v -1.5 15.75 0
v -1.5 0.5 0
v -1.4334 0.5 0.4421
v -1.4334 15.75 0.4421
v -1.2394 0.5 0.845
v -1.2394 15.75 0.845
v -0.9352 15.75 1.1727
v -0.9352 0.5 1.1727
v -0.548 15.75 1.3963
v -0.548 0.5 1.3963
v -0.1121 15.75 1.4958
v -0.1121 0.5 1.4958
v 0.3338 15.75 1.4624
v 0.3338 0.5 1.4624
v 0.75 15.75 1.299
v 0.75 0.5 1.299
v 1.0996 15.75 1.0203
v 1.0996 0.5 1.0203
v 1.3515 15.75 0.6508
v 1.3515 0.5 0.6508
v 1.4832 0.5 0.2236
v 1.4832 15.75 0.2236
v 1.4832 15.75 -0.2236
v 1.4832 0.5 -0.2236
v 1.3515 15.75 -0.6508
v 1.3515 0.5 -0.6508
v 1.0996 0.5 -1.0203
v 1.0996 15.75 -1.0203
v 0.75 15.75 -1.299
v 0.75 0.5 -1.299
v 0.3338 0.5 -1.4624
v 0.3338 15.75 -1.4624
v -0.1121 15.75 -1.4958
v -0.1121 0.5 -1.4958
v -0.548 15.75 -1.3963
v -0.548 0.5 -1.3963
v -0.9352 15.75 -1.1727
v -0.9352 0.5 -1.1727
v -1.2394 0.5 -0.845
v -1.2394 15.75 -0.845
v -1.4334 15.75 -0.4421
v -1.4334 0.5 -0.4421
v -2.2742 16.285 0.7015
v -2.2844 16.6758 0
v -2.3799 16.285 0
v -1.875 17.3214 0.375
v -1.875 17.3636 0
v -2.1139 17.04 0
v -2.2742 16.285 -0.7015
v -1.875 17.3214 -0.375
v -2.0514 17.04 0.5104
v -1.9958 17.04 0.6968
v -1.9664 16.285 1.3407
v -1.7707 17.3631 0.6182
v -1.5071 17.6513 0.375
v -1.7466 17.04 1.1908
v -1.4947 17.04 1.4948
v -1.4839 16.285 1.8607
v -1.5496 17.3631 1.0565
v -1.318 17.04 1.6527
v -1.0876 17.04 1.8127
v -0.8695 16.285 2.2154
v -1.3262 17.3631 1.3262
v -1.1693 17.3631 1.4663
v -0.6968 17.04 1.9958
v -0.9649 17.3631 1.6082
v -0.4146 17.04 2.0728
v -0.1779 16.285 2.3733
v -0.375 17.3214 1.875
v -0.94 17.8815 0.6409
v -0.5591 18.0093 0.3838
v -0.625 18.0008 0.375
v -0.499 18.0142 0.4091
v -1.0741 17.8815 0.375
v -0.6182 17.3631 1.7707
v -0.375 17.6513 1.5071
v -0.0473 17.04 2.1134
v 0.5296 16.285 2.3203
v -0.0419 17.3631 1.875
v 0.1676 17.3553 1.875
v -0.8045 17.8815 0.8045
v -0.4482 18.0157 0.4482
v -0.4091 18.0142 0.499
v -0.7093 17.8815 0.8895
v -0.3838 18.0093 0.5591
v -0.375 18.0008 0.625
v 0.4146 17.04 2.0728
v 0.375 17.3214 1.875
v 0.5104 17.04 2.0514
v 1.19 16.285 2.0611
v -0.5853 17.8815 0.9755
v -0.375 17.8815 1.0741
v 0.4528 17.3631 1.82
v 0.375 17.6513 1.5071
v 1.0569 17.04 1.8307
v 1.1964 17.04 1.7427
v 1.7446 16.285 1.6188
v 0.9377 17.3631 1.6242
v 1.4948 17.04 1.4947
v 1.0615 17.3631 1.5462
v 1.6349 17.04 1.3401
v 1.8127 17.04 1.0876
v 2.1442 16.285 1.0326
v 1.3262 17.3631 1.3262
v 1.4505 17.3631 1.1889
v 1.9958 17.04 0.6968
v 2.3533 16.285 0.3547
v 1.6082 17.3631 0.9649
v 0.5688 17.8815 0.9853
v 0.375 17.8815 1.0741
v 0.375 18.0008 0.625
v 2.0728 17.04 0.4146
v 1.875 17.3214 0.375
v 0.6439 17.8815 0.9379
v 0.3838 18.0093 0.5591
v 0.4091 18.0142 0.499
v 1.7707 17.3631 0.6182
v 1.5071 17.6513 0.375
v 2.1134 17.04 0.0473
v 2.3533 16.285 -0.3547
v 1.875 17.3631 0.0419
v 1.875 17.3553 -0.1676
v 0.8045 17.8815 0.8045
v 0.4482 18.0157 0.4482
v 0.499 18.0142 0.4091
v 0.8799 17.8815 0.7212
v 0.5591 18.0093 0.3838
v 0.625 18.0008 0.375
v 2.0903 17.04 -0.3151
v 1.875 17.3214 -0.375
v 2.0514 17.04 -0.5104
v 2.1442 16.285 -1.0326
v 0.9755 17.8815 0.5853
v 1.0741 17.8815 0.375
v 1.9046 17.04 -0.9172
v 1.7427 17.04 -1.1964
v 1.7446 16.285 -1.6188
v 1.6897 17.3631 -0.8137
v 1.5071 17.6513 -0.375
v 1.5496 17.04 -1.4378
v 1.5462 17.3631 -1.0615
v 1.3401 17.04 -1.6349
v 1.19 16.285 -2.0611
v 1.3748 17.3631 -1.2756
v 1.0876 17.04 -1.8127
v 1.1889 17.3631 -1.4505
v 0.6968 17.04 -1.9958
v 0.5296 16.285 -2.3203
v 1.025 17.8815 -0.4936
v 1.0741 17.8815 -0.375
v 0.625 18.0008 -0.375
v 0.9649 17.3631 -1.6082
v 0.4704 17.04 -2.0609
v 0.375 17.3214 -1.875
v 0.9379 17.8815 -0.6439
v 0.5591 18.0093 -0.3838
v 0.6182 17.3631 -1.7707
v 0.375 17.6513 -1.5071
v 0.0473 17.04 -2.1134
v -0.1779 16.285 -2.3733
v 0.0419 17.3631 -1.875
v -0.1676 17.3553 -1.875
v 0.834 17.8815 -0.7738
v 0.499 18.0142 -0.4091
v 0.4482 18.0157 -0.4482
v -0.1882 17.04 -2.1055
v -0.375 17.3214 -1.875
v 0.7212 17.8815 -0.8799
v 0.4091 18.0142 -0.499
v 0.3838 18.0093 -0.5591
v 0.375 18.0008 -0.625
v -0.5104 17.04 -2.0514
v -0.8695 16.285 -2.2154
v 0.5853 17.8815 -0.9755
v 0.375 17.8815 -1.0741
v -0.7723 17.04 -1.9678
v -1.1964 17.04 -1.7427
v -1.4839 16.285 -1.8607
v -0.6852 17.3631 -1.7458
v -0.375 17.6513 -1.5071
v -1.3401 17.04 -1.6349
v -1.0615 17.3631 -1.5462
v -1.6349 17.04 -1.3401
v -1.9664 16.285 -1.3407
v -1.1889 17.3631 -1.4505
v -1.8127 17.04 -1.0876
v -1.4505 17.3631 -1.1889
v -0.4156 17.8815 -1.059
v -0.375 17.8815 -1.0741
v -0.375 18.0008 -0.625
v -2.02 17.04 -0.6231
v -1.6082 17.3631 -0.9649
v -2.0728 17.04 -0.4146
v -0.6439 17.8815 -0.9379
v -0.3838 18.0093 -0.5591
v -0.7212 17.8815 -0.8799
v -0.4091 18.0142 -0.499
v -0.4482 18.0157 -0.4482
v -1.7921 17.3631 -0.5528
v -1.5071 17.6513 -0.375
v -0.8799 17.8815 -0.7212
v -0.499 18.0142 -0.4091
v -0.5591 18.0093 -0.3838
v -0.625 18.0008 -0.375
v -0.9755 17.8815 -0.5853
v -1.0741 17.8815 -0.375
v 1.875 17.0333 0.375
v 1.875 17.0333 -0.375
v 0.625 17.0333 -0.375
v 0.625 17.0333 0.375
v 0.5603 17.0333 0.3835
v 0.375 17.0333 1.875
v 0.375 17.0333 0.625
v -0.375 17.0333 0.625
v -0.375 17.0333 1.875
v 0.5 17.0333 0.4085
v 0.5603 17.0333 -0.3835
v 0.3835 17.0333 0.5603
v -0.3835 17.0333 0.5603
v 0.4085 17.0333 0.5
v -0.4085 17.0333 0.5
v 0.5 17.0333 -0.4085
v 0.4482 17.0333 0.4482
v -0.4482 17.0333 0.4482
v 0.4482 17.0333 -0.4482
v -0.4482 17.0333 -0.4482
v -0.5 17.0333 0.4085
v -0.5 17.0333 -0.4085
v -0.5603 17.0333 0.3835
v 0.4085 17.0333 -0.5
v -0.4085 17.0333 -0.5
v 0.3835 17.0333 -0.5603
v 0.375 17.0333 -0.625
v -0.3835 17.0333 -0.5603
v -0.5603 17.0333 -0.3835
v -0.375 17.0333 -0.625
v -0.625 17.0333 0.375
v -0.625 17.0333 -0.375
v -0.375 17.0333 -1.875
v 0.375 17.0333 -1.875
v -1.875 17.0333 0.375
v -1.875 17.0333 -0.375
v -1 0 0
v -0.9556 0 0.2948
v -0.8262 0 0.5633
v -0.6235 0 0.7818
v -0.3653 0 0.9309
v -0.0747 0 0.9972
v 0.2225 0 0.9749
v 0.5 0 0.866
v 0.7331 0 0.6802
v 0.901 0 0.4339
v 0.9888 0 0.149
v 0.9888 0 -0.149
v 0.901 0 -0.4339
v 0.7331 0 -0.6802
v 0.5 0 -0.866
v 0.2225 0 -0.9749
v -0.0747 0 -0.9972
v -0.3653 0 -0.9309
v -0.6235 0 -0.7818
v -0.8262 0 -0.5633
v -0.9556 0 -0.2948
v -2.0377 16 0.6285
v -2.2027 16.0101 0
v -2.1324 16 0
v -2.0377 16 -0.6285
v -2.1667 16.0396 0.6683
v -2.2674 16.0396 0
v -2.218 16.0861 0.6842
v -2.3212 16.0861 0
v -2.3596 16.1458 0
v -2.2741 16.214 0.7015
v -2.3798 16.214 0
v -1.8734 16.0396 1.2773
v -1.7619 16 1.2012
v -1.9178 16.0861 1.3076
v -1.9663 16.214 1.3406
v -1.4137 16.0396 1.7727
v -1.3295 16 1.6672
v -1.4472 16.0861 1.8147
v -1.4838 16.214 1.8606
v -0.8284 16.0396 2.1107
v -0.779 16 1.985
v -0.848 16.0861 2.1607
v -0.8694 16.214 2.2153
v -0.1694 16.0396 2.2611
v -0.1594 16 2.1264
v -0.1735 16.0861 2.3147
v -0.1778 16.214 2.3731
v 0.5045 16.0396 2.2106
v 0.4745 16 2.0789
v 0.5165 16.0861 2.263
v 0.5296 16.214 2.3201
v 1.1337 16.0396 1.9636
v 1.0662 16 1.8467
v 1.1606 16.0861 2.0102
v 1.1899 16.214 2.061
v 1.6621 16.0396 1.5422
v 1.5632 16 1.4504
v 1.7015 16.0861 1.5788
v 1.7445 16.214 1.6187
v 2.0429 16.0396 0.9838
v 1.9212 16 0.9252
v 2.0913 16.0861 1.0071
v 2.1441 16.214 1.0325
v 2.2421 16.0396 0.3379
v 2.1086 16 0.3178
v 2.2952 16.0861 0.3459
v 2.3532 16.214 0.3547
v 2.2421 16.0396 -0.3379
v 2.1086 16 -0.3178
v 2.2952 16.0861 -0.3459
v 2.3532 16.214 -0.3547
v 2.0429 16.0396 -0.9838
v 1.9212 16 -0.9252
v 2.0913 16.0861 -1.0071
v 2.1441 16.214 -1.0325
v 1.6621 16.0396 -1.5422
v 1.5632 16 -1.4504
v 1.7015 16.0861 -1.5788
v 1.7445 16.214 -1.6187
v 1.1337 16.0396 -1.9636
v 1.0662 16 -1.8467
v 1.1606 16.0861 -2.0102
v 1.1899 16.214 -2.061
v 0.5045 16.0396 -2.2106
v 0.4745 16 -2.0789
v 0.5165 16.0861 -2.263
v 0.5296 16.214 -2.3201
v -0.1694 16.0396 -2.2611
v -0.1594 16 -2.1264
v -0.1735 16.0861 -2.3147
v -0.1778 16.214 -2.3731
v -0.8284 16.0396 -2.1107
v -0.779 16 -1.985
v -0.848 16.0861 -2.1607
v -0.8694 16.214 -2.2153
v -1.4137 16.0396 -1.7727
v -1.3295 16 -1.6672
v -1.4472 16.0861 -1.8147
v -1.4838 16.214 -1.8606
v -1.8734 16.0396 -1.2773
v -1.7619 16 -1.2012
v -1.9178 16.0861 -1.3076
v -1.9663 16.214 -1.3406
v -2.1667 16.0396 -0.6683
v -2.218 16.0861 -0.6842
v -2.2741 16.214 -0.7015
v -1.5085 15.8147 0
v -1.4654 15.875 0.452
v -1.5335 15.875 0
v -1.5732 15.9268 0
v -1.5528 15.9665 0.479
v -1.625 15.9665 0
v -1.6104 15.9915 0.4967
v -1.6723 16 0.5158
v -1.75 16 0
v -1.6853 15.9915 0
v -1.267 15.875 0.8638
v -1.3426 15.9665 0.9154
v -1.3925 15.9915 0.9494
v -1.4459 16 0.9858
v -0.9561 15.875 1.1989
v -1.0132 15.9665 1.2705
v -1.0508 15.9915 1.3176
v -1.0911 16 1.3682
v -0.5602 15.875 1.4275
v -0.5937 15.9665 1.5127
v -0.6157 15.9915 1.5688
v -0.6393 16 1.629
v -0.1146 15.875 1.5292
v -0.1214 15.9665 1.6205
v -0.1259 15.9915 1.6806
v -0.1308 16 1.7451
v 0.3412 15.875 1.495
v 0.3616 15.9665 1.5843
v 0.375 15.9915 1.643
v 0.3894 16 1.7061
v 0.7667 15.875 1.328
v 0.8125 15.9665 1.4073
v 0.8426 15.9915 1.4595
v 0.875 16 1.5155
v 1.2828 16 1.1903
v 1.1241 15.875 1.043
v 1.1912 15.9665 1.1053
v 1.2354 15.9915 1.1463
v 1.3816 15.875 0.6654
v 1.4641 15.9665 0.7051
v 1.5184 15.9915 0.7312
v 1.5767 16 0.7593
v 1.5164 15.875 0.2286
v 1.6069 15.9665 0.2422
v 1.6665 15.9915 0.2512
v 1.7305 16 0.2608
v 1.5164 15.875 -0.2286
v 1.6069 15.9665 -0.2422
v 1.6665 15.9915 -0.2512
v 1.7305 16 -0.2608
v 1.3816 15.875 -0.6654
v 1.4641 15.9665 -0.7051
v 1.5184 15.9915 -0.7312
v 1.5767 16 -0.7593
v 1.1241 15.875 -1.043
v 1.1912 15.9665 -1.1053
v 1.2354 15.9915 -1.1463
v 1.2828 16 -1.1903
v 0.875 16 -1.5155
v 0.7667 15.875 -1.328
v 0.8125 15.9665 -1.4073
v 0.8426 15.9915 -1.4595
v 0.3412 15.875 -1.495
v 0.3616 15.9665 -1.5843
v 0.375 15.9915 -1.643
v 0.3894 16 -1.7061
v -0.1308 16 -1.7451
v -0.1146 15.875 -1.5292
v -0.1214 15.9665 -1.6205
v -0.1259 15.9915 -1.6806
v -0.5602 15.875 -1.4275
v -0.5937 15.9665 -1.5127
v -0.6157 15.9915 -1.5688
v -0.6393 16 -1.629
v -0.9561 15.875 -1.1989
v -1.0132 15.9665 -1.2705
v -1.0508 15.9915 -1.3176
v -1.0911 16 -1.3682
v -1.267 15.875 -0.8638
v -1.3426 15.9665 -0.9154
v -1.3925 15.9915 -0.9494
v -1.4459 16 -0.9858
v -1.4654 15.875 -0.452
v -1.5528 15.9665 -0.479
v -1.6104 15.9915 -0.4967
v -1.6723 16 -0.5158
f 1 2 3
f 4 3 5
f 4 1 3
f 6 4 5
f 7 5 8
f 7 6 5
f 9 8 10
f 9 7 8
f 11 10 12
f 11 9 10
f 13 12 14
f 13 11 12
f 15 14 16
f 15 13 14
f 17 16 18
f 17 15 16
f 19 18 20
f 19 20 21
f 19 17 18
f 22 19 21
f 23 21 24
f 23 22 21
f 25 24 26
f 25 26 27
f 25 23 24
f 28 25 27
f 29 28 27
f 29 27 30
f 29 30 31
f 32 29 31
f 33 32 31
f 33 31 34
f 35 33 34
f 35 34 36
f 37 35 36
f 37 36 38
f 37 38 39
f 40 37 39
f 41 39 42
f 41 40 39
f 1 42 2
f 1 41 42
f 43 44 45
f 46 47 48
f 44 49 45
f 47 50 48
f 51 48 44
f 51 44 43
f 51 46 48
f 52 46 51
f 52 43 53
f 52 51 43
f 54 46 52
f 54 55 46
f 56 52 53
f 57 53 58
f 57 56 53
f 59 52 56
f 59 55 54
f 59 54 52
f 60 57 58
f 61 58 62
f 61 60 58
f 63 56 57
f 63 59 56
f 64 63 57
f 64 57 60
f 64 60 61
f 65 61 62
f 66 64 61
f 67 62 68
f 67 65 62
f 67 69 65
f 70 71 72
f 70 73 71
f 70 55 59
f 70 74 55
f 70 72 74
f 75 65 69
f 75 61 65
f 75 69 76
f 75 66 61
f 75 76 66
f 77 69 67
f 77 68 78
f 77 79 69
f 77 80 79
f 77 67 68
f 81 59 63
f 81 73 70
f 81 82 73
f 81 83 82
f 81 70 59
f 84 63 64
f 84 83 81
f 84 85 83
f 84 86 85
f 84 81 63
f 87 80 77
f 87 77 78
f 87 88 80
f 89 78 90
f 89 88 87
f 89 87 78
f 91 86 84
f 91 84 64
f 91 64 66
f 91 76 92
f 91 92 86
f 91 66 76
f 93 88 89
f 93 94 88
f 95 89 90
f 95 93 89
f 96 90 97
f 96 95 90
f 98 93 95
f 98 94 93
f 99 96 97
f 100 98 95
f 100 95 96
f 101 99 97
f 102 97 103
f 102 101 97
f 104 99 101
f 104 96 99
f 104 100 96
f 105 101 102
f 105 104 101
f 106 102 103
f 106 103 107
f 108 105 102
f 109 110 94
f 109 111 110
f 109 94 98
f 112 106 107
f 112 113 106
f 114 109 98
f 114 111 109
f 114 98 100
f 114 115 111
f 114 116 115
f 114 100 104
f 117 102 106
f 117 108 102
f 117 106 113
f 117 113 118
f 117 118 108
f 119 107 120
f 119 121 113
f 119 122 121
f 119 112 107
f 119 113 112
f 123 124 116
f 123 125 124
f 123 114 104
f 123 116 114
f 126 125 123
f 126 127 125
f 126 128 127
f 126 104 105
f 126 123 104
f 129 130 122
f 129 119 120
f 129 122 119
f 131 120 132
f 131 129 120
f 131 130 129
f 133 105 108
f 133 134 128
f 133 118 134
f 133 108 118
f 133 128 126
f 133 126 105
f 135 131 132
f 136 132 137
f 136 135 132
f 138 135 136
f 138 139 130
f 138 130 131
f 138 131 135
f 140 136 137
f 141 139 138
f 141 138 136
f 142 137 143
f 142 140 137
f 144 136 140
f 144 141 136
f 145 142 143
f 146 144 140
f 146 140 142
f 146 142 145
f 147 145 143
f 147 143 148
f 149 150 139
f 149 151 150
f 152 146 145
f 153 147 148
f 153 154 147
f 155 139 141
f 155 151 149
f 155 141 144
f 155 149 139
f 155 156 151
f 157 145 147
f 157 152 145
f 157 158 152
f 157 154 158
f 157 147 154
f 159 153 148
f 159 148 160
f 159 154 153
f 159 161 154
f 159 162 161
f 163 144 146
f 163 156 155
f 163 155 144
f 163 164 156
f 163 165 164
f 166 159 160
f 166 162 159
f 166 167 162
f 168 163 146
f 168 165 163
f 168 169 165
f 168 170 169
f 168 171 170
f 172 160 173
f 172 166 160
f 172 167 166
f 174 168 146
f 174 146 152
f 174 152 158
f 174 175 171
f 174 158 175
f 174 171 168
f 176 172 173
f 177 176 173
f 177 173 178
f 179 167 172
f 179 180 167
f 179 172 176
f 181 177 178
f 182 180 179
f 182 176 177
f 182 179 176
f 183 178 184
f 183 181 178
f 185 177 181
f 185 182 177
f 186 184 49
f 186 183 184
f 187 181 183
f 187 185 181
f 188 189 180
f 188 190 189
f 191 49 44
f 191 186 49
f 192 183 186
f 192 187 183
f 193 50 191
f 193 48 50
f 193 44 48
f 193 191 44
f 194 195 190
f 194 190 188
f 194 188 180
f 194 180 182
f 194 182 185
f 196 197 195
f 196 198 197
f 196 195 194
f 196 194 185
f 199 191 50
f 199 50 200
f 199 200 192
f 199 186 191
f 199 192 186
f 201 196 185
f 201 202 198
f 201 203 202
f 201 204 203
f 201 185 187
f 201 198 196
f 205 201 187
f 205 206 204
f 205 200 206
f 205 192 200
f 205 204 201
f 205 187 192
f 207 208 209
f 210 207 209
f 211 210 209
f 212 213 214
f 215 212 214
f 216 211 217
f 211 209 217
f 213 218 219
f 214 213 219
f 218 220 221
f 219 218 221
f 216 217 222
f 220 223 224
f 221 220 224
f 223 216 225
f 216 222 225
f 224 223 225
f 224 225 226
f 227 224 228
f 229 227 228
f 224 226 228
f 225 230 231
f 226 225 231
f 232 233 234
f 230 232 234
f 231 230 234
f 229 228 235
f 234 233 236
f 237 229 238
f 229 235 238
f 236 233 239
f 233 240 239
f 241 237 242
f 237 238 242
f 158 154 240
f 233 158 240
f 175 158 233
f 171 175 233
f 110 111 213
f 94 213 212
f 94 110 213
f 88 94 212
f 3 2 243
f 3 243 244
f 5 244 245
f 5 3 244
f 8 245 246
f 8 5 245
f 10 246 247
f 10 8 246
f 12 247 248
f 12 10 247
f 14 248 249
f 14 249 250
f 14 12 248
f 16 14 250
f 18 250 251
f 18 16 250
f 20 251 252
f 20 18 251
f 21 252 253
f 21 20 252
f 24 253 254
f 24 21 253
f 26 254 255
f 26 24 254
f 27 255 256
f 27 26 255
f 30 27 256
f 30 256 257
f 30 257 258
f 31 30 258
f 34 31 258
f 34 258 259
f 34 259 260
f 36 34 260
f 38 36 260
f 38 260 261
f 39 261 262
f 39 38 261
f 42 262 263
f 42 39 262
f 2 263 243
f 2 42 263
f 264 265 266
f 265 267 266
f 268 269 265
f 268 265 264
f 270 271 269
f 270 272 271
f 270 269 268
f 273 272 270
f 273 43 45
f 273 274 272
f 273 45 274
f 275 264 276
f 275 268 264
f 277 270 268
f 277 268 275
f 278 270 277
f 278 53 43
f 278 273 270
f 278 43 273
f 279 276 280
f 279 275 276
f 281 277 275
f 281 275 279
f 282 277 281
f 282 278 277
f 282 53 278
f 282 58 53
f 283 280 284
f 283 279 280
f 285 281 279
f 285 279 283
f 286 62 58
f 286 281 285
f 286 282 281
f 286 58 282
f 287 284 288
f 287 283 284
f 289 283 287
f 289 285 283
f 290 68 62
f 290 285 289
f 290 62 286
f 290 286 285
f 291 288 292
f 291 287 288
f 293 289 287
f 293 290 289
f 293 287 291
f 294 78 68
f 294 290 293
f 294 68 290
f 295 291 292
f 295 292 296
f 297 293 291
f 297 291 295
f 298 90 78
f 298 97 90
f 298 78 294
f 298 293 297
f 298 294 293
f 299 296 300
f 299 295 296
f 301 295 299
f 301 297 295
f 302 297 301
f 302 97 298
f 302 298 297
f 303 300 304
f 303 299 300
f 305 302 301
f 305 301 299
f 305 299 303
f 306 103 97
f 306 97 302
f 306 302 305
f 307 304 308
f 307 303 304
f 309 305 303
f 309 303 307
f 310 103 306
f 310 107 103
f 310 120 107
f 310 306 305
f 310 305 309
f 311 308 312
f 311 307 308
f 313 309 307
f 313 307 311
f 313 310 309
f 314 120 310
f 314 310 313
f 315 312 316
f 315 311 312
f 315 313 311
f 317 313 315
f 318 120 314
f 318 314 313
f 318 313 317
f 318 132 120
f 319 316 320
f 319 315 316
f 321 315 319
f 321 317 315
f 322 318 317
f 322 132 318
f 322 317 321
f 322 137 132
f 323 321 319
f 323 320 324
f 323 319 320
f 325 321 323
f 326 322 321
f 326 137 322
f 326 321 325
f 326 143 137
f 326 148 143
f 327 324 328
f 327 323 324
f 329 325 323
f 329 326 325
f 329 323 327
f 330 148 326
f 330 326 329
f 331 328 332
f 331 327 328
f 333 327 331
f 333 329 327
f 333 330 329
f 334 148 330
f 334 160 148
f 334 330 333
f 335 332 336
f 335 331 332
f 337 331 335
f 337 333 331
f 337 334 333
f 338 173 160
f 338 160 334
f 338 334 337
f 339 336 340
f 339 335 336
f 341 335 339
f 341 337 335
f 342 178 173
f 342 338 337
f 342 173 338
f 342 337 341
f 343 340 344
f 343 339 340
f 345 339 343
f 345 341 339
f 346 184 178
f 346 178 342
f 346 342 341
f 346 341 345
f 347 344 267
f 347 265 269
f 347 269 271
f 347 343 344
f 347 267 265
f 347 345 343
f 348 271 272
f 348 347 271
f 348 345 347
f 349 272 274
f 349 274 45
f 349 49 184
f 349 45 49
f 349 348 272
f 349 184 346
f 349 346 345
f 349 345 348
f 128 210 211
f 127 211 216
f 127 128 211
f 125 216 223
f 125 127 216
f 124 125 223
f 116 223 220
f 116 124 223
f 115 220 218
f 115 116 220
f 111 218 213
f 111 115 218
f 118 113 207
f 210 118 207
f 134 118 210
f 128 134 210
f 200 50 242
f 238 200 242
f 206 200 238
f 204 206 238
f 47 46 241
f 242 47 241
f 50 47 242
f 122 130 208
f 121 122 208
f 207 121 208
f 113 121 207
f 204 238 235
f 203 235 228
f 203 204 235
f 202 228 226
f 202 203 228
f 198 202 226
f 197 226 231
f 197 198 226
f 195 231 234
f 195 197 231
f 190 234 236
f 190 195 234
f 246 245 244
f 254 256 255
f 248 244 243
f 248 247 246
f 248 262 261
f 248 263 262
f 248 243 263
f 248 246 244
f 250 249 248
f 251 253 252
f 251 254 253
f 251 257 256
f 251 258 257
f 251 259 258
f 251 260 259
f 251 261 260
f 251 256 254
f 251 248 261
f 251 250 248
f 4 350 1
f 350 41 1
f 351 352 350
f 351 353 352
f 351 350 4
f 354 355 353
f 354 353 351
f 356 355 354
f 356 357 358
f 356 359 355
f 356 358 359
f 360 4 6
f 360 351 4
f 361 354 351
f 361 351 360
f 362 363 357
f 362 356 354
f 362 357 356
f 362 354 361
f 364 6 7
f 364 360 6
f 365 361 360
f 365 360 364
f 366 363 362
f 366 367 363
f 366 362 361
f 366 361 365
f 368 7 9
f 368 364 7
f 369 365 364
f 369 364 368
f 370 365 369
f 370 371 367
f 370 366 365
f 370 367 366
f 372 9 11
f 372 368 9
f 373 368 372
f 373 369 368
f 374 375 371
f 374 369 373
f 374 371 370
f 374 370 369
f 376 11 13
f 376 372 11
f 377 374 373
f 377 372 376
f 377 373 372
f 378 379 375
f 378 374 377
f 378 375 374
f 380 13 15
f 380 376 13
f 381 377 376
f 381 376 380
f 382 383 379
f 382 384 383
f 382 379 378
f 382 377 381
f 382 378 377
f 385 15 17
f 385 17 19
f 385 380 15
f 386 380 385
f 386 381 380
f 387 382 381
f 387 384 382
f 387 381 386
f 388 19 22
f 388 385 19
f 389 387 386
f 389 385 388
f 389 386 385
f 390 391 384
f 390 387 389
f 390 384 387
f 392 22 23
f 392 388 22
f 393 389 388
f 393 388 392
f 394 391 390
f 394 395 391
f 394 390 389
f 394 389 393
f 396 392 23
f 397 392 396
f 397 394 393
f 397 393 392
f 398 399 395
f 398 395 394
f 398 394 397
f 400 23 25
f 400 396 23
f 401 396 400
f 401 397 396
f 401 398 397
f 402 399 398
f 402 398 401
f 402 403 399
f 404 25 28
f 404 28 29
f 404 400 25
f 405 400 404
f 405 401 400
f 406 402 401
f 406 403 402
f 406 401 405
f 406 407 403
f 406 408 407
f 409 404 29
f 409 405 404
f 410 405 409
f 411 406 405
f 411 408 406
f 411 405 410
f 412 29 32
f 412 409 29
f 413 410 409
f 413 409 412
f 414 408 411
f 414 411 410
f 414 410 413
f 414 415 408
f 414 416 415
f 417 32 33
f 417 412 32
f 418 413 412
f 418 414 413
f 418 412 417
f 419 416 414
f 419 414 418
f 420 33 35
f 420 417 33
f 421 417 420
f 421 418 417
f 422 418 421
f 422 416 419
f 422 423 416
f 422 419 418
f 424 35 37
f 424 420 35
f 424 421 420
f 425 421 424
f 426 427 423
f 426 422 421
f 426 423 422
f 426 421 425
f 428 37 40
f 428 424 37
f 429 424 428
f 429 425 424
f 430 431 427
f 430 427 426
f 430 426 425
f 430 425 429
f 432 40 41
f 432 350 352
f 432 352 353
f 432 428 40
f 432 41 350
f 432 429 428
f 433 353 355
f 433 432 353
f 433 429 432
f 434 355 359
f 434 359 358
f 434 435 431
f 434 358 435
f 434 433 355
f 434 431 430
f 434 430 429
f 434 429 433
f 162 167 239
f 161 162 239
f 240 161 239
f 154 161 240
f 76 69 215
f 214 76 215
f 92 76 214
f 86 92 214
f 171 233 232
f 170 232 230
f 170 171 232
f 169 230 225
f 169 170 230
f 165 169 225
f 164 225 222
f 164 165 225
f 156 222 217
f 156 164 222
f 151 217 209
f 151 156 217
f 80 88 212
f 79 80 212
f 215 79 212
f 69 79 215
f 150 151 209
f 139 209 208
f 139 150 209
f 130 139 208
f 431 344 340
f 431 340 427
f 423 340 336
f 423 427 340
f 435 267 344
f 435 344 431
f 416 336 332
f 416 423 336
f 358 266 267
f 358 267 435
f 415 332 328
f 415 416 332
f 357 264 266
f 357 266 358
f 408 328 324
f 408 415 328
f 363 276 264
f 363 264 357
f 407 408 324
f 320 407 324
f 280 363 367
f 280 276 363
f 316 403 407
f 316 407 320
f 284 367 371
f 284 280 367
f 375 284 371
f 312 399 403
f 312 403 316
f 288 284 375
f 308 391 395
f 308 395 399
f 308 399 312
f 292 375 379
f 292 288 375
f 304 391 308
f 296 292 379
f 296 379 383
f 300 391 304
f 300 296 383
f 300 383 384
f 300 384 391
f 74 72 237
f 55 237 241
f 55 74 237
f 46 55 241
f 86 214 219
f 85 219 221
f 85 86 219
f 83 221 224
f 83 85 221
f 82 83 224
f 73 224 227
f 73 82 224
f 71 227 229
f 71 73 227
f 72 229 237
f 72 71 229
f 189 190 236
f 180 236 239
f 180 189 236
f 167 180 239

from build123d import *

# Parameters (mm, degrees)
CHAMFER1_SIZE      = 0.5
CUT_EXTRUDE3_DEPTH = 1


with BuildPart() as part:
    # Sketch1 → Revolve1 (revolve)
    with BuildSketch(Plane.XY):
        with BuildLine():
            Line((0, 0), (-1.5, 0))
            Line((-1.5, 0), (-1.5, 15.75))
            ThreePointArc((-1.5, 15.75), (-1.573223305, 15.926776695), (-1.75, 16))
            Line((-1.75, 16), (-2.132389685, 16))
            ThreePointArc((-2.132389685, 16), (-2.321151019, 16.086081853), (-2.379920949, 16.285046729))
            ThreePointArc((-2.379920949, 16.285046729), (-1.555396609, 17.649656197), (0, 18))
            Line((0, 18), (0, 0))
        make_face()
    revolve(axis=Axis((0, 0, 0), (0, 1, 0)))

    # Chamfer1
    chamfer1_edges = [part.edges().sort_by_distance(p)[0] for p in [
        (1.5, 0, 0),
    ]]
    chamfer(chamfer1_edges, length=CHAMFER1_SIZE)

    # Sketch9 → Cut-Extrude3 (cut)
    with BuildSketch(Plane(origin=(0, 18.033333333, 0), x_dir=(1, 0, 0), z_dir=(0, 1, 0))):
        with BuildLine():
            Line((-0.375, 1.875), (0.375, 1.875))
            Line((0.375, 1.875), (0.375, 0.625))
            ThreePointArc((0.375, 0.625), (0.448223305, 0.448223305), (0.625, 0.375))
            Line((0.625, 0.375), (1.875, 0.375))
            Line((1.875, 0.375), (1.875, -0.375))
            Line((1.875, -0.375), (0.625, -0.375))
            ThreePointArc((0.625, -0.375), (0.448223305, -0.448223305), (0.375, -0.625))
            Line((0.375, -0.625), (0.375, -1.875))
            Line((0.375, -1.875), (-0.375, -1.875))
            Line((-0.375, -1.875), (-0.375, -0.625))
            ThreePointArc((-0.375, -0.625), (-0.448223305, -0.448223305), (-0.625, -0.375))
            Line((-0.625, -0.375), (-1.875, -0.375))
            Line((-1.875, -0.375), (-1.875, 0.375))
            Line((-1.875, 0.375), (-0.625, 0.375))
            ThreePointArc((-0.625, 0.375), (-0.448223305, 0.448223305), (-0.375, 0.625))
            Line((-0.375, 0.625), (-0.375, 1.875))
        make_face()
    extrude(amount=-CUT_EXTRUDE3_DEPTH, mode=Mode.SUBTRACT)


solid = part.part
